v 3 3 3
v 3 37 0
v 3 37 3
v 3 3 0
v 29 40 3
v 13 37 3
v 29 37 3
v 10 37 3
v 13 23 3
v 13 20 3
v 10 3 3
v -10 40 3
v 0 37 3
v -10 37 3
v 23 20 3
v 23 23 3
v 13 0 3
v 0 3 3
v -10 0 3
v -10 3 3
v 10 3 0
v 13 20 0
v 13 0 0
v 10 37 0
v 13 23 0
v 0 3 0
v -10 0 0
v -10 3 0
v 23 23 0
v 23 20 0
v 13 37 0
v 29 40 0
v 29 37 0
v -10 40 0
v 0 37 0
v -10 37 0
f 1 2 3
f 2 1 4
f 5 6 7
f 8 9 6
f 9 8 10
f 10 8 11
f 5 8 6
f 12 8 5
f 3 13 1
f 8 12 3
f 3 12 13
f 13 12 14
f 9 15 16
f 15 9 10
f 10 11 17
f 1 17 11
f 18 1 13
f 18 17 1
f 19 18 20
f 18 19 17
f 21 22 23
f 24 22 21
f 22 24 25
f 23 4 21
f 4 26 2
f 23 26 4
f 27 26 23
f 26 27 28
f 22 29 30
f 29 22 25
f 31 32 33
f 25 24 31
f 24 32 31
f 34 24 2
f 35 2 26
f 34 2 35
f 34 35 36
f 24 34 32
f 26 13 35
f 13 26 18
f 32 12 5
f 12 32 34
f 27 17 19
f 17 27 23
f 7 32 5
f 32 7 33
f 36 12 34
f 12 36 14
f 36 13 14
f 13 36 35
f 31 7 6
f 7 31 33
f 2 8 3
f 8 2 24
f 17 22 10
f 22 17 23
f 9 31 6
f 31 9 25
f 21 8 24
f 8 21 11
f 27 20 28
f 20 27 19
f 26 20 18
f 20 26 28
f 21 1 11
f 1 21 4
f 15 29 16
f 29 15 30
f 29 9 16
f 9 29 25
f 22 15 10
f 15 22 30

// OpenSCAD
 translate([]) cube([3,40,3]);
 translate([-10,37,0]) cube([39,3,3]);
 translate([10,0,0]) cube([3,40,3]);
 translate([-10,0,0]) cube([20,3,3]);
 translate([10,20,0]) cube([13,3,3]); 
